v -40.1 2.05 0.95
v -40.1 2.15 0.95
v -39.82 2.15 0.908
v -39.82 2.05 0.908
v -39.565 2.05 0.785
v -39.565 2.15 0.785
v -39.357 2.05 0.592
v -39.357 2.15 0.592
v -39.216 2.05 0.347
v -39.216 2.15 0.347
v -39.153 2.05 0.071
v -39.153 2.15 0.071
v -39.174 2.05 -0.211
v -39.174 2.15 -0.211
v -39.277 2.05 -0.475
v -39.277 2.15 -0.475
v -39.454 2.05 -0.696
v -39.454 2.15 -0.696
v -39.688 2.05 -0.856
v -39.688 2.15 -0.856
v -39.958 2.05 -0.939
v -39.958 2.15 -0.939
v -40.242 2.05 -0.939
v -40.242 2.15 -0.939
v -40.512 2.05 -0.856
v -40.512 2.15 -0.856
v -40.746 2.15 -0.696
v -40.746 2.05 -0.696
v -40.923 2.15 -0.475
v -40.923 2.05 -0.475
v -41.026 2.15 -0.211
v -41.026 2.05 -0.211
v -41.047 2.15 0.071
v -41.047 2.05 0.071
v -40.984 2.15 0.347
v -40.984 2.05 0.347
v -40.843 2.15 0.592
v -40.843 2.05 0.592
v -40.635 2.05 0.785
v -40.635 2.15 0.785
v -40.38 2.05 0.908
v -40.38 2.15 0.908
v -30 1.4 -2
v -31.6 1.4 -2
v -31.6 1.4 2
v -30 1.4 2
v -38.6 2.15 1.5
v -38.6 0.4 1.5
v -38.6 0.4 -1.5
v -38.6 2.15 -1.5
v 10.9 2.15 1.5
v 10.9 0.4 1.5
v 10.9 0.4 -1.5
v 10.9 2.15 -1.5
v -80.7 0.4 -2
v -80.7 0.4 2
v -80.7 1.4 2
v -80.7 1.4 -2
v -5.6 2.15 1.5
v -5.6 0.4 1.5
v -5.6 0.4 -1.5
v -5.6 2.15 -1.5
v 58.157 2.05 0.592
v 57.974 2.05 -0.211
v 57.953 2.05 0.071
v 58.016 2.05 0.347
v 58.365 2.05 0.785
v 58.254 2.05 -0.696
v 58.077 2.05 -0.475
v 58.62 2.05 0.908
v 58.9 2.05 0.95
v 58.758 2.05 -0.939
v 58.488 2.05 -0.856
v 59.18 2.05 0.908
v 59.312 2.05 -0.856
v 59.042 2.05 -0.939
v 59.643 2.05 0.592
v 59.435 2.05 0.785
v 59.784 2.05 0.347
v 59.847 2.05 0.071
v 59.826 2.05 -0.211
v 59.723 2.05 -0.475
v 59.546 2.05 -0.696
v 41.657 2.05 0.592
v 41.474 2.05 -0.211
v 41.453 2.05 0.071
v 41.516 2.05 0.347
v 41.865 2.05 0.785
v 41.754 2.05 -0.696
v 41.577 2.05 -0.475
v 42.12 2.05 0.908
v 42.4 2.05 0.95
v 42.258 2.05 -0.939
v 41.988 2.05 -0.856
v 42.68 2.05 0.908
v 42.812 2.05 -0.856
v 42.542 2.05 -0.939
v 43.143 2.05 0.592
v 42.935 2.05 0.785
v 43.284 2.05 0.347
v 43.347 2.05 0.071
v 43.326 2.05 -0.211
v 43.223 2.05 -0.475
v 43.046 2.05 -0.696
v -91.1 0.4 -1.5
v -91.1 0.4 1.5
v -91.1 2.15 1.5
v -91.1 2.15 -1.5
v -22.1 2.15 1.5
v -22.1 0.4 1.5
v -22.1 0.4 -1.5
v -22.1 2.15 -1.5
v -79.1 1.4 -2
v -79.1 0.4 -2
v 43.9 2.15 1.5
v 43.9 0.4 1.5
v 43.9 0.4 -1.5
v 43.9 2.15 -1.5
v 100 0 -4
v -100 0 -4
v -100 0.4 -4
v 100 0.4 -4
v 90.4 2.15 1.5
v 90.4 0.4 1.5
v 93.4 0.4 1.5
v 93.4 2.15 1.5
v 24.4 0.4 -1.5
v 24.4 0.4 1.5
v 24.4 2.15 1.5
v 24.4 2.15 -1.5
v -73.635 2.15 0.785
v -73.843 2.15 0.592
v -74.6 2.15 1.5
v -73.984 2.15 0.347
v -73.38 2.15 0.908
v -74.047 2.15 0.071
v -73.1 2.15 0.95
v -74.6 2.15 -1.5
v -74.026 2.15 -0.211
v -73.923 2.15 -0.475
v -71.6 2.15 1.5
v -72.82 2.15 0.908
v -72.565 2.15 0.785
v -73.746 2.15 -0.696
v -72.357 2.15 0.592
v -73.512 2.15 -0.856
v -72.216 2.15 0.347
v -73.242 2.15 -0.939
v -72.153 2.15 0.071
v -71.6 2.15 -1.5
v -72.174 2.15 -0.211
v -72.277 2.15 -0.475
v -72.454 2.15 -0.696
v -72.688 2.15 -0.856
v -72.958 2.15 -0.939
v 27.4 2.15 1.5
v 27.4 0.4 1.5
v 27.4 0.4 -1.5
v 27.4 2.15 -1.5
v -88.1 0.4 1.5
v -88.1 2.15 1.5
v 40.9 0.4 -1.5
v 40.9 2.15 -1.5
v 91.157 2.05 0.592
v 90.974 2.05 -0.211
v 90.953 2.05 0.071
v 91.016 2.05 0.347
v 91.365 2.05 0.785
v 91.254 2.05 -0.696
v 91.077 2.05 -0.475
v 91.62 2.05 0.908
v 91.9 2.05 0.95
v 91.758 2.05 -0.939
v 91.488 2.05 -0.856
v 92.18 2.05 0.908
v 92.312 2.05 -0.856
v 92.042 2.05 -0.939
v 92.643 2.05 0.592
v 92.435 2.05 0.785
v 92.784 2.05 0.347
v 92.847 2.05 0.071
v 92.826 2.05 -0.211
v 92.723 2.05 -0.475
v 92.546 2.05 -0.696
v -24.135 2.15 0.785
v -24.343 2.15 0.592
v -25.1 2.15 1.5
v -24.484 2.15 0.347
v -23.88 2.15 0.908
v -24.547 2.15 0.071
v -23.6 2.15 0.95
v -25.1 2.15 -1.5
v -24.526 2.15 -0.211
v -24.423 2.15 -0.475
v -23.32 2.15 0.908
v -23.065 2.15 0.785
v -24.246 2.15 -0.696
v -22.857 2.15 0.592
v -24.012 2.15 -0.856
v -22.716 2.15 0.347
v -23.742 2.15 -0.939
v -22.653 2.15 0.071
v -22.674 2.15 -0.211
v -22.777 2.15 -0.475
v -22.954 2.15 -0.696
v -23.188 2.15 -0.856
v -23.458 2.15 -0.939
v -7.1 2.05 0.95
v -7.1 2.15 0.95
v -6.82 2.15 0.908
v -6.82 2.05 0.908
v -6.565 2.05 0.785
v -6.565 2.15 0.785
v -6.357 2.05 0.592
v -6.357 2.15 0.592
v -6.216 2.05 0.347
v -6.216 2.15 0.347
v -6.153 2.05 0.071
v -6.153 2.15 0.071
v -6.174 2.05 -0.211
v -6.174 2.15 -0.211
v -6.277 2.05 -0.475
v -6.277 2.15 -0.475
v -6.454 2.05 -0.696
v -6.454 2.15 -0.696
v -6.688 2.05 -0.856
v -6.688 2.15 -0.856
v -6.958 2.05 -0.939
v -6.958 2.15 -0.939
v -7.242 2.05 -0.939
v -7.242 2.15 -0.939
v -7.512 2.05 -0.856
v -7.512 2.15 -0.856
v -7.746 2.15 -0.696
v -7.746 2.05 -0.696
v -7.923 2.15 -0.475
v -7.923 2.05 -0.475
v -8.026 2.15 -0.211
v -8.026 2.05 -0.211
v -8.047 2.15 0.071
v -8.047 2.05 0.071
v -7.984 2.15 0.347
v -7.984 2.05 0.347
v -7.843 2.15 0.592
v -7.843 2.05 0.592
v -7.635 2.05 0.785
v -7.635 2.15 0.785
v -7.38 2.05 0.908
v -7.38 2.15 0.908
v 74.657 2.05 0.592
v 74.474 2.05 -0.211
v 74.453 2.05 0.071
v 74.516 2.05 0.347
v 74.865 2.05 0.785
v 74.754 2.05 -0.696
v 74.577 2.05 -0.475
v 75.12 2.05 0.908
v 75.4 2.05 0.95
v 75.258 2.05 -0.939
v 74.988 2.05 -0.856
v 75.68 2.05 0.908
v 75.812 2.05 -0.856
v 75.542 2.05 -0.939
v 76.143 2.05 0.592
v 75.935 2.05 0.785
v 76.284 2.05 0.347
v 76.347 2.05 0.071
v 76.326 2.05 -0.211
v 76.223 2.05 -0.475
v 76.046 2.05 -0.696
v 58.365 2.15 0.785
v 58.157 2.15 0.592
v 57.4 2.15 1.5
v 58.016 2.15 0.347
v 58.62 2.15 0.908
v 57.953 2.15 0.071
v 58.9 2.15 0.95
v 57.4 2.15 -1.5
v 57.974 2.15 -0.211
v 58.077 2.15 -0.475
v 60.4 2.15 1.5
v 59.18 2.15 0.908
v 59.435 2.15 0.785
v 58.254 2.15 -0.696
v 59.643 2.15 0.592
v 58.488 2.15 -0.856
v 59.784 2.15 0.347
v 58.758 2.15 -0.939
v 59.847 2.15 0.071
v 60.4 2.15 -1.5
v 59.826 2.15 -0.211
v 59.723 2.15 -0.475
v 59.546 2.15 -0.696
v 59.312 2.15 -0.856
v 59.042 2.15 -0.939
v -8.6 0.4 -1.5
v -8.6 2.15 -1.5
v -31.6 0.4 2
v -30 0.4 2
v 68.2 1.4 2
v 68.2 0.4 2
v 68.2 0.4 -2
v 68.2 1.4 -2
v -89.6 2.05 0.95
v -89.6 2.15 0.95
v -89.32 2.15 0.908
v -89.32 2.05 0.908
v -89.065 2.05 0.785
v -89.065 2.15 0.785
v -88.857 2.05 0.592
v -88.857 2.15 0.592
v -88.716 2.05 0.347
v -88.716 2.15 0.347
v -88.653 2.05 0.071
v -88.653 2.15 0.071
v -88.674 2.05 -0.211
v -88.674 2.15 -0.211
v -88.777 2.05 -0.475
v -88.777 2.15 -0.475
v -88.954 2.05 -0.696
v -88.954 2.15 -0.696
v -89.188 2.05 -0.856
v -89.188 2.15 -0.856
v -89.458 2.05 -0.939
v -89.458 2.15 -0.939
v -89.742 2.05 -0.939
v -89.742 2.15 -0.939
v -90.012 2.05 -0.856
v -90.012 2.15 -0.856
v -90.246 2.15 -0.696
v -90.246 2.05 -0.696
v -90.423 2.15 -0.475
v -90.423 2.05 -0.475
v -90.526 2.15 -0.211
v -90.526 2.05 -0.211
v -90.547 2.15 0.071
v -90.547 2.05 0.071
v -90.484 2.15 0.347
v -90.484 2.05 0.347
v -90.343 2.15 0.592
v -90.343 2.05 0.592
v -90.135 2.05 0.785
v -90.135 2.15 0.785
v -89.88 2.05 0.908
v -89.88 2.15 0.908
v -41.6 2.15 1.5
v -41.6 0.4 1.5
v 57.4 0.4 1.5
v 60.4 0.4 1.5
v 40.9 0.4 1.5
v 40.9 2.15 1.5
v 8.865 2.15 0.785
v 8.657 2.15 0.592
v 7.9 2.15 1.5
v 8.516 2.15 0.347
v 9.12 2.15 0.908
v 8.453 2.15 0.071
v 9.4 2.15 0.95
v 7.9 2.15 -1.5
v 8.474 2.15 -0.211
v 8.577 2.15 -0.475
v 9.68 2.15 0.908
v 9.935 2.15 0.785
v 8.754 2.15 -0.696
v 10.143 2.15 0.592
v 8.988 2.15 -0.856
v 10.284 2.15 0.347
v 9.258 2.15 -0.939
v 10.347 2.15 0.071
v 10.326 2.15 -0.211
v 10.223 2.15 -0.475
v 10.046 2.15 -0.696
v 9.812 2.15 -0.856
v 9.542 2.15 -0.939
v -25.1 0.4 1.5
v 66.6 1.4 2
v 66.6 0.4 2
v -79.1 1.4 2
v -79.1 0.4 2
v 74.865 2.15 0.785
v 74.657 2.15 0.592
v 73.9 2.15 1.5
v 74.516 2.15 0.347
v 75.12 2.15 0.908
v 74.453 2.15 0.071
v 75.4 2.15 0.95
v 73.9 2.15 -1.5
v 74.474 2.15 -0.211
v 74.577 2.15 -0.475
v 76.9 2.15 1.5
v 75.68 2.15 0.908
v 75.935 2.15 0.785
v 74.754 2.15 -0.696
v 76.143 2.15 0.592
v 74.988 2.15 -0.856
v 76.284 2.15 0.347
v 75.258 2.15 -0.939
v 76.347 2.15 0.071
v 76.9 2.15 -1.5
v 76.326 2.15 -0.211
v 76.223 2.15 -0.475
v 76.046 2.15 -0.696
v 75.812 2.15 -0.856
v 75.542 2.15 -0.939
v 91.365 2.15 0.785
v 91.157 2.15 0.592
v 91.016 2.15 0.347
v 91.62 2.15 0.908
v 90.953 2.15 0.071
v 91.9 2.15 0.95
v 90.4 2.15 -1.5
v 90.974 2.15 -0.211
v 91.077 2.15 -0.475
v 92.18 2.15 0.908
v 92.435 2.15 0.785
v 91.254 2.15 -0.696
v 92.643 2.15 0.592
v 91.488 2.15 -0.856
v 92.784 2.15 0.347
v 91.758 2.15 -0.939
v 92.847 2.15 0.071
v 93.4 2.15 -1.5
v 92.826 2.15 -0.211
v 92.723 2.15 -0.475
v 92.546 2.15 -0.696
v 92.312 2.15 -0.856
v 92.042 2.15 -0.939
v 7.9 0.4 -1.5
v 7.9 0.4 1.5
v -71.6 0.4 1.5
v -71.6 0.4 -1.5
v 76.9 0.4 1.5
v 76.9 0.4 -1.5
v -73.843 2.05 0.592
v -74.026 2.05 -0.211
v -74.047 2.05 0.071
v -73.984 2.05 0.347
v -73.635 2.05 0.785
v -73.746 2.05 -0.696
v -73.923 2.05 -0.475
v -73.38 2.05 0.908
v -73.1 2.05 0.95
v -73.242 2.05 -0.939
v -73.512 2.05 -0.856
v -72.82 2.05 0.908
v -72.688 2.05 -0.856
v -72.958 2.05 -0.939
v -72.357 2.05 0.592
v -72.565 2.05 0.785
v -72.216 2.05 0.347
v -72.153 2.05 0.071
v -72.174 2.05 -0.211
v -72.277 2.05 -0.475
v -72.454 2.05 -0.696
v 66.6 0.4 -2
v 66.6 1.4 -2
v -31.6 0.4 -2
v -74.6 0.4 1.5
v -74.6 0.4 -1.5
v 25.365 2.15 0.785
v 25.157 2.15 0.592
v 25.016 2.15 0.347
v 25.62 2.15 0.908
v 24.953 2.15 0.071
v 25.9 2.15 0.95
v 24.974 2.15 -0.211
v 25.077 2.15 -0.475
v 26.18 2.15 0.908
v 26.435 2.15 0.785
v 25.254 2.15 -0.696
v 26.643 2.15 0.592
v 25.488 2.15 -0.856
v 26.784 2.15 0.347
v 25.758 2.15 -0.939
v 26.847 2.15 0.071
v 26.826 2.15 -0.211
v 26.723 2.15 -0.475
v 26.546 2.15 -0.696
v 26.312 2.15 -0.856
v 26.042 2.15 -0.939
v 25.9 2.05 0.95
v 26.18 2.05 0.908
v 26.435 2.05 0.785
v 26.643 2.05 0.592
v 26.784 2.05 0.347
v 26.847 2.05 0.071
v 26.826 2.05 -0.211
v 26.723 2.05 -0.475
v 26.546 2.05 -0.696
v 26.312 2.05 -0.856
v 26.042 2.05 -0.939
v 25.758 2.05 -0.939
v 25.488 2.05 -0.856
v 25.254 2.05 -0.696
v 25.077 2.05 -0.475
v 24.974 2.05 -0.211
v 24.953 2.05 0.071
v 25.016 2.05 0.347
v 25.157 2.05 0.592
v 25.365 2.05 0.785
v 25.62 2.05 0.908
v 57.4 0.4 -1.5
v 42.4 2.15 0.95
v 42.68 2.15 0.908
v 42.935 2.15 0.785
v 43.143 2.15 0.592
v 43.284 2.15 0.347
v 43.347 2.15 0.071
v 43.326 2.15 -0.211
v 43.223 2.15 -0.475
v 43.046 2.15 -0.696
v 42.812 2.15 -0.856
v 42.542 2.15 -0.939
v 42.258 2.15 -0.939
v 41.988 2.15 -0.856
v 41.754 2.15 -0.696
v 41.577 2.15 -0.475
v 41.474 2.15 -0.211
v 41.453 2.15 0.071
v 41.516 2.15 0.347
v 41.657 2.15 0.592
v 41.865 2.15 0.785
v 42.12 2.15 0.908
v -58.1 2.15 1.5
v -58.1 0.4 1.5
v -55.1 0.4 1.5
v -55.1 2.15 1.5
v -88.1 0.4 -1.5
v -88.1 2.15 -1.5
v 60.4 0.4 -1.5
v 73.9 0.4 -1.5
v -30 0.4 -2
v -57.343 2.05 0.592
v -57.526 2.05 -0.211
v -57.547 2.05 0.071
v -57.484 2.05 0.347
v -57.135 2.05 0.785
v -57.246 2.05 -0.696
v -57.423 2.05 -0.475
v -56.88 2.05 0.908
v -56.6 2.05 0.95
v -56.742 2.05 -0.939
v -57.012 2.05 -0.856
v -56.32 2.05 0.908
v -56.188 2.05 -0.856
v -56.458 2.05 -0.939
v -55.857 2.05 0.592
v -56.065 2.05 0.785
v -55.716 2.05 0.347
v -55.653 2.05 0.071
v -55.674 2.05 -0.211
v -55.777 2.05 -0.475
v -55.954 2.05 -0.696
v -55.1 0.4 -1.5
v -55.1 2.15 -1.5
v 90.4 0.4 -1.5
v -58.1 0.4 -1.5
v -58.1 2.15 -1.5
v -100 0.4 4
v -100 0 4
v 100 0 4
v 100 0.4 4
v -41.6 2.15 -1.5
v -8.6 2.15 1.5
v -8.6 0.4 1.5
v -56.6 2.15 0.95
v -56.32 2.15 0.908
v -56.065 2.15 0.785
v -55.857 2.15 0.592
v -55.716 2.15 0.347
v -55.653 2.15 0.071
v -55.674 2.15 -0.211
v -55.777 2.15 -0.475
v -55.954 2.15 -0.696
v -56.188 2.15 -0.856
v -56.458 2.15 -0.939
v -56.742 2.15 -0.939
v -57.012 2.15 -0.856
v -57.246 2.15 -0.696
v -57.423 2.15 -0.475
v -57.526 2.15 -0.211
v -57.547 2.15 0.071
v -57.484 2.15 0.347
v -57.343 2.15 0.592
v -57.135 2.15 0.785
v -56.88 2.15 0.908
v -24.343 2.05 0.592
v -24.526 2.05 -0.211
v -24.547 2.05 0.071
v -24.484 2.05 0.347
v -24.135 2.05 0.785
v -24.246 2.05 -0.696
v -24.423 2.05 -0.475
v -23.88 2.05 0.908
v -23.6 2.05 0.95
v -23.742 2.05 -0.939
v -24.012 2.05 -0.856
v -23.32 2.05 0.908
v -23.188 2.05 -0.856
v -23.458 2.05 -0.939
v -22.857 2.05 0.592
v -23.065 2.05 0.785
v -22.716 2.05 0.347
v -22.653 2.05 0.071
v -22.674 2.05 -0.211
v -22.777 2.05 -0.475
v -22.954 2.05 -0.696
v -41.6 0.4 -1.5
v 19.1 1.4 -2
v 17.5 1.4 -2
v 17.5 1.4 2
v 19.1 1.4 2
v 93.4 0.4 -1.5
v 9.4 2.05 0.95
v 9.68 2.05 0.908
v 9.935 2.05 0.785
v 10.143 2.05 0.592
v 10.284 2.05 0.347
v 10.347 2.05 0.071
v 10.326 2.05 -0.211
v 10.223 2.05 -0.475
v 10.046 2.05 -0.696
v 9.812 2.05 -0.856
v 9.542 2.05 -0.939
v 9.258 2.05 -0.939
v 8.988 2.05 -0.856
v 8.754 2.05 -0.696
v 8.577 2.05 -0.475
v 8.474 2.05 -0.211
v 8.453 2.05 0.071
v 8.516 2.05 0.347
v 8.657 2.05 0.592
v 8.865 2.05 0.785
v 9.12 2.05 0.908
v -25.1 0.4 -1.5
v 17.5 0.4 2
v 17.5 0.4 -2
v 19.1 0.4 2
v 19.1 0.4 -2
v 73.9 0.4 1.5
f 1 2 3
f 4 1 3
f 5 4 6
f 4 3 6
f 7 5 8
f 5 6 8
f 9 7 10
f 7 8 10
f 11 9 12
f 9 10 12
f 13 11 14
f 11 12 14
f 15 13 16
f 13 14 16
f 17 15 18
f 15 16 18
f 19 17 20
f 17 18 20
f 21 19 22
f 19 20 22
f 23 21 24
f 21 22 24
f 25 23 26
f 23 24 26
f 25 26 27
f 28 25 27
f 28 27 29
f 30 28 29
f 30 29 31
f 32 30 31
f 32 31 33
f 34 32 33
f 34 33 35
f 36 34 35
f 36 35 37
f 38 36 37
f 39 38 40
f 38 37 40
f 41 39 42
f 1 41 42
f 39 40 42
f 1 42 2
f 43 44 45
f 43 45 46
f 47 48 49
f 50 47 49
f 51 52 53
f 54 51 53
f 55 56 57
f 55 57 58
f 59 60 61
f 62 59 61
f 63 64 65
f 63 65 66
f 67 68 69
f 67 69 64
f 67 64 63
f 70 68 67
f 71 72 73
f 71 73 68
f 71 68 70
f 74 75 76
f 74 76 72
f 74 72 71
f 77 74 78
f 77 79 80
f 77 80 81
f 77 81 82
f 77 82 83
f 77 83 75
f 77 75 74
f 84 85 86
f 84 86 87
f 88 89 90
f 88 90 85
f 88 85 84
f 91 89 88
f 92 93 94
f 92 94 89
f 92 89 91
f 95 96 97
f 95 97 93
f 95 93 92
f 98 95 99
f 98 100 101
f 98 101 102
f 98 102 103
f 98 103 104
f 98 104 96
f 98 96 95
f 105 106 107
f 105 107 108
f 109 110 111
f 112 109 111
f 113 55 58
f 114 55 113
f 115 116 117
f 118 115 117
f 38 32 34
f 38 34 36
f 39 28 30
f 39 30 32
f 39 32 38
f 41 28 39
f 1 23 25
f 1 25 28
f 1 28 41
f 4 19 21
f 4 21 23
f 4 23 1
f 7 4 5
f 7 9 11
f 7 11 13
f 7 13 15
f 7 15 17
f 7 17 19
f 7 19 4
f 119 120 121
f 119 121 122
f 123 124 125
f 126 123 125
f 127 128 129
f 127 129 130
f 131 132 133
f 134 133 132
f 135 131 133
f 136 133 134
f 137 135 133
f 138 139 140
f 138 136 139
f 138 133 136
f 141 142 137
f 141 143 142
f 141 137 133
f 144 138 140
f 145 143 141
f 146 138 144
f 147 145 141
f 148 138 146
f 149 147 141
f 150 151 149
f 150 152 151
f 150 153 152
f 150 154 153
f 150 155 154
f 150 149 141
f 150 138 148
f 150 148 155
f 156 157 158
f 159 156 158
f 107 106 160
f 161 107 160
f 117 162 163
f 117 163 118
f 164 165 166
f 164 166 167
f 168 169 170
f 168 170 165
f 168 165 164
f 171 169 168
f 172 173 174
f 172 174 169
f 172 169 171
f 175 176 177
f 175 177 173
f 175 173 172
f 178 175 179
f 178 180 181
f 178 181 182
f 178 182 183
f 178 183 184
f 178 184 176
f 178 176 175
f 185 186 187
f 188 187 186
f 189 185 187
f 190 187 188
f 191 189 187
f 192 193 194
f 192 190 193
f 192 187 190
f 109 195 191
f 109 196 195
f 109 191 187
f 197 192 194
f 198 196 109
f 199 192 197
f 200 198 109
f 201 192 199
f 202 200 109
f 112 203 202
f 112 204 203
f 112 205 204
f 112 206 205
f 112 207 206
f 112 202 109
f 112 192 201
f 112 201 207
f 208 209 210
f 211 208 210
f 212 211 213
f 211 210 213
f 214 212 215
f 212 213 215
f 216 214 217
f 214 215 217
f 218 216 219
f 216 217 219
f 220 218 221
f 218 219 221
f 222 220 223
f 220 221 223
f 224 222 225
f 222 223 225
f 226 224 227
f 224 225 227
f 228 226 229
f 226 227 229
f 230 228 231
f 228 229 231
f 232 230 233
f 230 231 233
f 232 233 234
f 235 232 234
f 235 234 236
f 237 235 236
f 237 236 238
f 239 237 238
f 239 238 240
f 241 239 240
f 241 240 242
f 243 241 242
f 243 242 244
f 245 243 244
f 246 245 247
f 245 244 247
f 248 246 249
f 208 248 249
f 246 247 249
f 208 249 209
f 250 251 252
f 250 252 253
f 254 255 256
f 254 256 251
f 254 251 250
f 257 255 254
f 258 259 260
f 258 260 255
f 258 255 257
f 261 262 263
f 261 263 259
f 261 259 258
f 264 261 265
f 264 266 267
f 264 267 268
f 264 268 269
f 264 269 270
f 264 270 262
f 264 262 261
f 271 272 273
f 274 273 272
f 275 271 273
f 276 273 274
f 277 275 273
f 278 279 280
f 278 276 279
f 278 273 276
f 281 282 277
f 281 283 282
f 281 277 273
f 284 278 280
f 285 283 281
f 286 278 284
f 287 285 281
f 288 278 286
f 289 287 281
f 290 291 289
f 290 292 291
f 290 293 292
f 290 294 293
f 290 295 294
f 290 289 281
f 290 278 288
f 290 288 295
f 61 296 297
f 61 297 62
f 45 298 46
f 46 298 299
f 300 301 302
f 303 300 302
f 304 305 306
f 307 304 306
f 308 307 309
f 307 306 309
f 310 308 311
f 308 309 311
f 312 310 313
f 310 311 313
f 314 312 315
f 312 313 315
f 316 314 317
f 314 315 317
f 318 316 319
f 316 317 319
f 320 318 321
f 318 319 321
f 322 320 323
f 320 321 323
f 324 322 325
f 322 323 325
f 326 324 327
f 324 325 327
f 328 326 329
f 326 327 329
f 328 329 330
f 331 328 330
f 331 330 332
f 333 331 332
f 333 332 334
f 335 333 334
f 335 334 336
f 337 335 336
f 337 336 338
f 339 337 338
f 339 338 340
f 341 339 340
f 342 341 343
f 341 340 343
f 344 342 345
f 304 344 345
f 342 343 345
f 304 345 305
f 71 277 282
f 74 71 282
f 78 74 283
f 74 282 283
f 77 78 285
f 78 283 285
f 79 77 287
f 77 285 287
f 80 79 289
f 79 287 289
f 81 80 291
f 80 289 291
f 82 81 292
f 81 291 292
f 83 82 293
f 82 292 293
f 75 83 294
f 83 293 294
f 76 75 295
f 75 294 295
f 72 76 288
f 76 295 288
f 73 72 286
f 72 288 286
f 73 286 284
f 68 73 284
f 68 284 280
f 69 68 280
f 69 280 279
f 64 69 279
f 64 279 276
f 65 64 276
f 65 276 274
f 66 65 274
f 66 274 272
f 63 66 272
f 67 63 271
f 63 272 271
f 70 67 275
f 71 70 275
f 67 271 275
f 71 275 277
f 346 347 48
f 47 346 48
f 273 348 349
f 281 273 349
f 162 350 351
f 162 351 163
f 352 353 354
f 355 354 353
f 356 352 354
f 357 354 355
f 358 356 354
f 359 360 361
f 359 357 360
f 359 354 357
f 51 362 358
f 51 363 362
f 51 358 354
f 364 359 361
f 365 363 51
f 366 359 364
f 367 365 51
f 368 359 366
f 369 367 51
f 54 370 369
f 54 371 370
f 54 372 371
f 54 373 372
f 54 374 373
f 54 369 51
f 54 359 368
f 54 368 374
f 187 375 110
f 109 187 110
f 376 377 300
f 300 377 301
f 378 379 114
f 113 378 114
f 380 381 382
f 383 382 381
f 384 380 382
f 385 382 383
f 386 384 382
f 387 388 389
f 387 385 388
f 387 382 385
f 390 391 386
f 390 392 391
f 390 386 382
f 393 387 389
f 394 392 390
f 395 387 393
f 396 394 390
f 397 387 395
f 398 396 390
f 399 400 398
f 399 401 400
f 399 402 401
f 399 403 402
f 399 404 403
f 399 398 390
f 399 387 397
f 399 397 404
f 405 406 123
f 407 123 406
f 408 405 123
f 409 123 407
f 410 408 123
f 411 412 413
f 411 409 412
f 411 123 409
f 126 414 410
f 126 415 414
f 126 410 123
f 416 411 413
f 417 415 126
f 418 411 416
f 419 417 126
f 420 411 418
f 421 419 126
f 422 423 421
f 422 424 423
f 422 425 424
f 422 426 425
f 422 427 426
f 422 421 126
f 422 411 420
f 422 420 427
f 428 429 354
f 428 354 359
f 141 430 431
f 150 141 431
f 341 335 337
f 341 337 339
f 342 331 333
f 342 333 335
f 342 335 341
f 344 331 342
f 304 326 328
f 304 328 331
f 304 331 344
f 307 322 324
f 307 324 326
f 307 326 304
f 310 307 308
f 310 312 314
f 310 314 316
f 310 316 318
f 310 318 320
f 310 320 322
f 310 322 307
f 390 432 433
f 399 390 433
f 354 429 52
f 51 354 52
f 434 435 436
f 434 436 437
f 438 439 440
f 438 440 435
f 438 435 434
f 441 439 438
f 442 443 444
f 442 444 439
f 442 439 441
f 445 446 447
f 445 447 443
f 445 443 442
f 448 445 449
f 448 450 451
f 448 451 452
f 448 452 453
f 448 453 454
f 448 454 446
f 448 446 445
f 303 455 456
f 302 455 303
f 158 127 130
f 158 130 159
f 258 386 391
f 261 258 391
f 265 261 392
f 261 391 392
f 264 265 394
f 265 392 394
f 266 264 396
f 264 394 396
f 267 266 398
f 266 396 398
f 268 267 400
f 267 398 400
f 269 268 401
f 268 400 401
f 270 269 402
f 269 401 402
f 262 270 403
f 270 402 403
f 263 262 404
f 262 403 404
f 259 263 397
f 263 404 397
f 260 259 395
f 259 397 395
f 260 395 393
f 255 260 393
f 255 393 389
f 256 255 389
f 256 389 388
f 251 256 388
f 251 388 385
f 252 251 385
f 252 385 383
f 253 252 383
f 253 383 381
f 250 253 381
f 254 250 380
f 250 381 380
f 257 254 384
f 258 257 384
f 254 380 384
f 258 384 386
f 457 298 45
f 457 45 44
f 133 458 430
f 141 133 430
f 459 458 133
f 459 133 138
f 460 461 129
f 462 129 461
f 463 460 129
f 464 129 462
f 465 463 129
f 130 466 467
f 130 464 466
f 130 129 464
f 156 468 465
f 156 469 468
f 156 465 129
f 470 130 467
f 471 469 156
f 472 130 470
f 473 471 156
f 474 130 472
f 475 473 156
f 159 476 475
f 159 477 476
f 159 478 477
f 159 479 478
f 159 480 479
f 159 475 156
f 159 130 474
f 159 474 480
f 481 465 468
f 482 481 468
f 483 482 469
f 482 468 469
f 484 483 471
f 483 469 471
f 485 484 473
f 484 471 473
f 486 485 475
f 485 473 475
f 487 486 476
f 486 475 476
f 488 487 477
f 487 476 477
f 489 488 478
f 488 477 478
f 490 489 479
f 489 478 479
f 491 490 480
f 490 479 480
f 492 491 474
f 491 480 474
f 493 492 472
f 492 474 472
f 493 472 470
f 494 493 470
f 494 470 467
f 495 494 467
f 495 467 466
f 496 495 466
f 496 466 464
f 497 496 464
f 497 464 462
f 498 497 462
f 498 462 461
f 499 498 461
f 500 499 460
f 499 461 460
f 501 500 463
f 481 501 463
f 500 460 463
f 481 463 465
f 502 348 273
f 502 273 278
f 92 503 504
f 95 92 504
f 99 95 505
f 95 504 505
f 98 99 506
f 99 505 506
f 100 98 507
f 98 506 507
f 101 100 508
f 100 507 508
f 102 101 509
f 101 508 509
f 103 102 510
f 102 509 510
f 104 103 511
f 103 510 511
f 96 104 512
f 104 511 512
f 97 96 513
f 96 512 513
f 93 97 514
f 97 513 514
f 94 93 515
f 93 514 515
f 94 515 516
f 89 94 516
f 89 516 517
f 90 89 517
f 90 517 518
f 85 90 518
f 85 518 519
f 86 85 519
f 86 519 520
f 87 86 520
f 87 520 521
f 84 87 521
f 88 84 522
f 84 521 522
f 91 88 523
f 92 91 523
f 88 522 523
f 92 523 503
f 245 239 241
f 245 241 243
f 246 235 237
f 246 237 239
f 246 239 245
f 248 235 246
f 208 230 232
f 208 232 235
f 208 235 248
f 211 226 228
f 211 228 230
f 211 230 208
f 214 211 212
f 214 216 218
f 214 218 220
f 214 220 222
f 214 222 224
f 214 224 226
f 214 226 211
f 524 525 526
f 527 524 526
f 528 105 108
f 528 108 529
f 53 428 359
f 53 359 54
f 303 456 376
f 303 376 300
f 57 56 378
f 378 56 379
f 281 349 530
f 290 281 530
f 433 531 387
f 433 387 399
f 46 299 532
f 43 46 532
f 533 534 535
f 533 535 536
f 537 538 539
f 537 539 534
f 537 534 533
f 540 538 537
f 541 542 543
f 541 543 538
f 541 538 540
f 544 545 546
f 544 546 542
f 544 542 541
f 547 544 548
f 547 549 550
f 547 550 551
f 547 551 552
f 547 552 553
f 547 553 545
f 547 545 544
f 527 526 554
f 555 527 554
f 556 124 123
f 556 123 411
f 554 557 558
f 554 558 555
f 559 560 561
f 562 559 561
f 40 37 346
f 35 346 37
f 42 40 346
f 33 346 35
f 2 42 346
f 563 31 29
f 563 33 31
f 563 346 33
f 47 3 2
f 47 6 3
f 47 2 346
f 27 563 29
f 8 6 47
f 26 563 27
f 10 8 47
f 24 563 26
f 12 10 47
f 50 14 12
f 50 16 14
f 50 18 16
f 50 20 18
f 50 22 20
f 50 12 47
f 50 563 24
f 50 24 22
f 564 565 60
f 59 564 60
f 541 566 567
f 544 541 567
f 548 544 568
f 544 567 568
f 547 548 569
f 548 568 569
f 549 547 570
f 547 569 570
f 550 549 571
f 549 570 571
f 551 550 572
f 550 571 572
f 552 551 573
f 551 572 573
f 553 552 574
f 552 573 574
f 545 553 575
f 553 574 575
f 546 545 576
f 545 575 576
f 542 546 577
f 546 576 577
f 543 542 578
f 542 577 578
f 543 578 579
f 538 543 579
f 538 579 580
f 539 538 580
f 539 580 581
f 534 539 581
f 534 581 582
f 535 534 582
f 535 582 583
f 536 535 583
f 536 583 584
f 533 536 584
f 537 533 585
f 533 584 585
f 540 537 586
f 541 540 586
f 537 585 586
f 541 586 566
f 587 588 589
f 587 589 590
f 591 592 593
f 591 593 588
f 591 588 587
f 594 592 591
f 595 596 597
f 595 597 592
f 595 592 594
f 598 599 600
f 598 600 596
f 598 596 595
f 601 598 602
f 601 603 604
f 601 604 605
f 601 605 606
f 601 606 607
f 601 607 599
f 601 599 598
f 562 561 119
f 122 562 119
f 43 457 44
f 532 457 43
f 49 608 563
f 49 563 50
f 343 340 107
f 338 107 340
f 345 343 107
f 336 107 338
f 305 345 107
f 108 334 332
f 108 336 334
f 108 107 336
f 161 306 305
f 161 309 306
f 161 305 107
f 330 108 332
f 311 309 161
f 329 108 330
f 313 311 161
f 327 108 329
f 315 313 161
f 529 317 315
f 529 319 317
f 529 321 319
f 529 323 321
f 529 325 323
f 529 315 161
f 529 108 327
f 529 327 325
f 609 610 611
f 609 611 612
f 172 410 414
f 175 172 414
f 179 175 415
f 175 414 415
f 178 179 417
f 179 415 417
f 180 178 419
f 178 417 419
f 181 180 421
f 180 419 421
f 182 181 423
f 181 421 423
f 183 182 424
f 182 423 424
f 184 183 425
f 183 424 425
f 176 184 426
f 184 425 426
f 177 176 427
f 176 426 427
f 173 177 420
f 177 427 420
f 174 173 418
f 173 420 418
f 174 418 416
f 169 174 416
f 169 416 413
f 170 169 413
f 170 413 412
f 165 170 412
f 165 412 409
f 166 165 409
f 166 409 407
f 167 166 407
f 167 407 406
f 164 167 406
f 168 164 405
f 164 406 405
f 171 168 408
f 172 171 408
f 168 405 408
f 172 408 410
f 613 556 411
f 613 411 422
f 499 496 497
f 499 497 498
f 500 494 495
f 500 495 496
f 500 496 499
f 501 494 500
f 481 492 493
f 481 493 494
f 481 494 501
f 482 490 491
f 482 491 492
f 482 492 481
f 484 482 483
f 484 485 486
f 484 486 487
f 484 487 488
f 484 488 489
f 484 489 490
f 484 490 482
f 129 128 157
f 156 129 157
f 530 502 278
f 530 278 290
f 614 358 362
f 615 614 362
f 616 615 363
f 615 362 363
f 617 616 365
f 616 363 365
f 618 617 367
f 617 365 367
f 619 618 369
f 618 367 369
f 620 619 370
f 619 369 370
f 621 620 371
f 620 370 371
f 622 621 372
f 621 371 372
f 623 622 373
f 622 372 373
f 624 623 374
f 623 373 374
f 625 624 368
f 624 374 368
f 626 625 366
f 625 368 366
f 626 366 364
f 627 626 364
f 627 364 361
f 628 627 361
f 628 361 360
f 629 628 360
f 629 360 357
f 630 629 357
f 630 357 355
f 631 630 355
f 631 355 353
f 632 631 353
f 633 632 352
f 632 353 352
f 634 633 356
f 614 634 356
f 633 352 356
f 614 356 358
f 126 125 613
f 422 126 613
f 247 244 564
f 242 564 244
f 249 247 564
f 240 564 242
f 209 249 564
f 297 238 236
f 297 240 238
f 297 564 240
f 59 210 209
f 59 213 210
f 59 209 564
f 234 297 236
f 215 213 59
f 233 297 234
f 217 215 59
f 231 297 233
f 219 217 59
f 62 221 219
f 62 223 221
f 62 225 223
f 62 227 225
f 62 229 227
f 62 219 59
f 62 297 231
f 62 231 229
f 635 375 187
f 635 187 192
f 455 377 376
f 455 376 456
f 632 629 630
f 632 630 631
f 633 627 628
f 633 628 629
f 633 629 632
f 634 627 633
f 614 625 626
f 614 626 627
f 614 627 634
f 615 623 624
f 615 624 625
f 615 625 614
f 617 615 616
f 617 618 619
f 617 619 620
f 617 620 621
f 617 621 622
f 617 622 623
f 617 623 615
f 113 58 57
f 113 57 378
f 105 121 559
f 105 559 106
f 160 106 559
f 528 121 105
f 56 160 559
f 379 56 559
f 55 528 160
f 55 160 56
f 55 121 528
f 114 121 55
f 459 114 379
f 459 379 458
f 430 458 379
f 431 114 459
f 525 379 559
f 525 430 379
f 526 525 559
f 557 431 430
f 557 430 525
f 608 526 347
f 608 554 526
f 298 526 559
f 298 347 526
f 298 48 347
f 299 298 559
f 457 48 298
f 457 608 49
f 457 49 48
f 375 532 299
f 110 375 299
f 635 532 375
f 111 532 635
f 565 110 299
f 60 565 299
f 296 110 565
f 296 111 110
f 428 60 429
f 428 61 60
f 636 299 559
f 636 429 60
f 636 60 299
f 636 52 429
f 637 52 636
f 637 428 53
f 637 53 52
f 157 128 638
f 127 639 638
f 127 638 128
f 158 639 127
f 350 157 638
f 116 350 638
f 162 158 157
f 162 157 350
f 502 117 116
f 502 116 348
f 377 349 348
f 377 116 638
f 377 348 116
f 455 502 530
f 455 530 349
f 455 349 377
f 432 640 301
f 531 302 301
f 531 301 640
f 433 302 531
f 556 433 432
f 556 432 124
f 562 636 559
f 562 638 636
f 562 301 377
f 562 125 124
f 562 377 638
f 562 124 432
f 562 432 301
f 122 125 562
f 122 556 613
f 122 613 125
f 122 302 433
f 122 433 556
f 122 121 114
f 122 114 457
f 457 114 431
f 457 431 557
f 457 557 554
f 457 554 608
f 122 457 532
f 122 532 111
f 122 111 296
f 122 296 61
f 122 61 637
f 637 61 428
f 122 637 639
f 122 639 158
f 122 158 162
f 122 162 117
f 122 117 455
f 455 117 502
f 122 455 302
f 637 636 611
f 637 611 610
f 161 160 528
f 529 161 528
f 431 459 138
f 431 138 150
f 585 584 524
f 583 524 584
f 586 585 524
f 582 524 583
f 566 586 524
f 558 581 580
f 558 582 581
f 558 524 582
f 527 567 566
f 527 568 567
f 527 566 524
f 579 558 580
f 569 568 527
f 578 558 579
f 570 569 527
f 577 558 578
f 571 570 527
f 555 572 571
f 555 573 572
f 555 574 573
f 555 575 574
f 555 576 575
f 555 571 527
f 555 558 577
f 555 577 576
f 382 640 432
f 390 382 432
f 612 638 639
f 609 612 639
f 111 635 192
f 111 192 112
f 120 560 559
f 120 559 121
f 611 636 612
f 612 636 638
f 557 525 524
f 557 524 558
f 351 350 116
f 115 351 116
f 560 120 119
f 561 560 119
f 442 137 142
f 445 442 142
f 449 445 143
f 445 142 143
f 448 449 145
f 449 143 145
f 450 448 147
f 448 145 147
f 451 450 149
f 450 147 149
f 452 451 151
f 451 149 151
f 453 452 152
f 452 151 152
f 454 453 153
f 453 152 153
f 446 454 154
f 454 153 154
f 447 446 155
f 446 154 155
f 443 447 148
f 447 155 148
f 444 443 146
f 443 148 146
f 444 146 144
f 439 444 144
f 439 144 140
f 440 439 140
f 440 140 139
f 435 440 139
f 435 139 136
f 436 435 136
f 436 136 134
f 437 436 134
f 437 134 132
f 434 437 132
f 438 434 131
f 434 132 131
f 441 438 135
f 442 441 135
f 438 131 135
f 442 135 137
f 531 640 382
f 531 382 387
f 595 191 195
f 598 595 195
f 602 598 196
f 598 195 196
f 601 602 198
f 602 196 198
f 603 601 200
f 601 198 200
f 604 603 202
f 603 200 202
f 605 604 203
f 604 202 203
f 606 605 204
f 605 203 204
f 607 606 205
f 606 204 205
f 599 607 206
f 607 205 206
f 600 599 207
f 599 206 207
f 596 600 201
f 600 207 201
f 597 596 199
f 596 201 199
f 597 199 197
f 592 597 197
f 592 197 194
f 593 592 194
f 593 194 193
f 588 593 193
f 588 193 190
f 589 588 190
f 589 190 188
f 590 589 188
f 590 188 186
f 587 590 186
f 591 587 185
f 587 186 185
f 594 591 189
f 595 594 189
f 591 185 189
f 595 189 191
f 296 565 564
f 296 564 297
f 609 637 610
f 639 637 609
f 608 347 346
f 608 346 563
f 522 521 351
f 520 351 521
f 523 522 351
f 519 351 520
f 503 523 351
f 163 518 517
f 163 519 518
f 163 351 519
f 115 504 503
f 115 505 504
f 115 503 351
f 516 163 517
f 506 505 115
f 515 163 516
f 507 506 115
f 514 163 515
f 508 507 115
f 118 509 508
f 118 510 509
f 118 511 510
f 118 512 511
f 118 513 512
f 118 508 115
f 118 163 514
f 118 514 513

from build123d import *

# Parameters (mm, degrees)
SKETCH1_W           = 200
SKETCH1_H           = 8
BOSS_EXTRUDE1_DEPTH = 0.4
SKETCH2_W           = 3
SKETCH2_H           = 3
BOSS_EXTRUDE2_DEPTH = 1.75
SKETCH3_R           = 0.95
CUT_EXTRUDE1_DEPTH  = 0.1
LPATTERN1_COUNT     = 12
LPATTERN1_PITCH     = 16.5
SKETCH4_W           = 1.6
SKETCH4_H           = 4
BOSS_EXTRUDE3_DEPTH = 1
LPATTERN2_COUNT     = 4
LPATTERN2_PITCH     = 49.1


with BuildPart() as part:
    # Sketch1 → Boss-Extrude1 (new body)
    with BuildSketch(Plane(origin=(0, 0, 0), x_dir=(1, 0, 0), z_dir=(0, 1, 0))):
        Rectangle(SKETCH1_W, SKETCH1_H)
    extrude(amount=BOSS_EXTRUDE1_DEPTH)

    # Sketch2 → Boss-Extrude2 (add)
    with BuildSketch(Plane(origin=(0, 0.4, 0), x_dir=(1, 0, 0), z_dir=(0, 1, 0))):
        with Locations((91.9, 0)):
            Rectangle(SKETCH2_W, SKETCH2_H)
    boss_extrude2 = extrude(amount=BOSS_EXTRUDE2_DEPTH)

    # Sketch3 → Cut-Extrude1 (cut)
    with BuildSketch(Plane(origin=(0, 2.15, 0), x_dir=(1, 0, 0), z_dir=(0, 1, 0))):
        with Locations((91.9, 0)):
            Circle(SKETCH3_R)
    cut_extrude1 = extrude(amount=-CUT_EXTRUDE1_DEPTH, mode=Mode.SUBTRACT)

    # LPattern1: Boss-Extrude2, Cut-Extrude1 ×12
    with Locations(*[(-i * LPATTERN1_PITCH, 0, 0) for i in range(1, LPATTERN1_COUNT)]):
        add(boss_extrude2)
        add(cut_extrude1, mode=Mode.SUBTRACT)

    # Sketch4 → Boss-Extrude3 (add)
    with BuildSketch(Plane(origin=(0, 0.4, 0), x_dir=(1, 0, 0), z_dir=(0, 1, 0))):
        with Locations((67.4, 0)):
            Rectangle(SKETCH4_W, SKETCH4_H)
    boss_extrude3 = extrude(amount=BOSS_EXTRUDE3_DEPTH)

    # LPattern2: Boss-Extrude3 ×4
    with Locations(*[(-i * LPATTERN2_PITCH, 0, 0) for i in range(1, LPATTERN2_COUNT)]):
        add(boss_extrude3)


solid = part.part
